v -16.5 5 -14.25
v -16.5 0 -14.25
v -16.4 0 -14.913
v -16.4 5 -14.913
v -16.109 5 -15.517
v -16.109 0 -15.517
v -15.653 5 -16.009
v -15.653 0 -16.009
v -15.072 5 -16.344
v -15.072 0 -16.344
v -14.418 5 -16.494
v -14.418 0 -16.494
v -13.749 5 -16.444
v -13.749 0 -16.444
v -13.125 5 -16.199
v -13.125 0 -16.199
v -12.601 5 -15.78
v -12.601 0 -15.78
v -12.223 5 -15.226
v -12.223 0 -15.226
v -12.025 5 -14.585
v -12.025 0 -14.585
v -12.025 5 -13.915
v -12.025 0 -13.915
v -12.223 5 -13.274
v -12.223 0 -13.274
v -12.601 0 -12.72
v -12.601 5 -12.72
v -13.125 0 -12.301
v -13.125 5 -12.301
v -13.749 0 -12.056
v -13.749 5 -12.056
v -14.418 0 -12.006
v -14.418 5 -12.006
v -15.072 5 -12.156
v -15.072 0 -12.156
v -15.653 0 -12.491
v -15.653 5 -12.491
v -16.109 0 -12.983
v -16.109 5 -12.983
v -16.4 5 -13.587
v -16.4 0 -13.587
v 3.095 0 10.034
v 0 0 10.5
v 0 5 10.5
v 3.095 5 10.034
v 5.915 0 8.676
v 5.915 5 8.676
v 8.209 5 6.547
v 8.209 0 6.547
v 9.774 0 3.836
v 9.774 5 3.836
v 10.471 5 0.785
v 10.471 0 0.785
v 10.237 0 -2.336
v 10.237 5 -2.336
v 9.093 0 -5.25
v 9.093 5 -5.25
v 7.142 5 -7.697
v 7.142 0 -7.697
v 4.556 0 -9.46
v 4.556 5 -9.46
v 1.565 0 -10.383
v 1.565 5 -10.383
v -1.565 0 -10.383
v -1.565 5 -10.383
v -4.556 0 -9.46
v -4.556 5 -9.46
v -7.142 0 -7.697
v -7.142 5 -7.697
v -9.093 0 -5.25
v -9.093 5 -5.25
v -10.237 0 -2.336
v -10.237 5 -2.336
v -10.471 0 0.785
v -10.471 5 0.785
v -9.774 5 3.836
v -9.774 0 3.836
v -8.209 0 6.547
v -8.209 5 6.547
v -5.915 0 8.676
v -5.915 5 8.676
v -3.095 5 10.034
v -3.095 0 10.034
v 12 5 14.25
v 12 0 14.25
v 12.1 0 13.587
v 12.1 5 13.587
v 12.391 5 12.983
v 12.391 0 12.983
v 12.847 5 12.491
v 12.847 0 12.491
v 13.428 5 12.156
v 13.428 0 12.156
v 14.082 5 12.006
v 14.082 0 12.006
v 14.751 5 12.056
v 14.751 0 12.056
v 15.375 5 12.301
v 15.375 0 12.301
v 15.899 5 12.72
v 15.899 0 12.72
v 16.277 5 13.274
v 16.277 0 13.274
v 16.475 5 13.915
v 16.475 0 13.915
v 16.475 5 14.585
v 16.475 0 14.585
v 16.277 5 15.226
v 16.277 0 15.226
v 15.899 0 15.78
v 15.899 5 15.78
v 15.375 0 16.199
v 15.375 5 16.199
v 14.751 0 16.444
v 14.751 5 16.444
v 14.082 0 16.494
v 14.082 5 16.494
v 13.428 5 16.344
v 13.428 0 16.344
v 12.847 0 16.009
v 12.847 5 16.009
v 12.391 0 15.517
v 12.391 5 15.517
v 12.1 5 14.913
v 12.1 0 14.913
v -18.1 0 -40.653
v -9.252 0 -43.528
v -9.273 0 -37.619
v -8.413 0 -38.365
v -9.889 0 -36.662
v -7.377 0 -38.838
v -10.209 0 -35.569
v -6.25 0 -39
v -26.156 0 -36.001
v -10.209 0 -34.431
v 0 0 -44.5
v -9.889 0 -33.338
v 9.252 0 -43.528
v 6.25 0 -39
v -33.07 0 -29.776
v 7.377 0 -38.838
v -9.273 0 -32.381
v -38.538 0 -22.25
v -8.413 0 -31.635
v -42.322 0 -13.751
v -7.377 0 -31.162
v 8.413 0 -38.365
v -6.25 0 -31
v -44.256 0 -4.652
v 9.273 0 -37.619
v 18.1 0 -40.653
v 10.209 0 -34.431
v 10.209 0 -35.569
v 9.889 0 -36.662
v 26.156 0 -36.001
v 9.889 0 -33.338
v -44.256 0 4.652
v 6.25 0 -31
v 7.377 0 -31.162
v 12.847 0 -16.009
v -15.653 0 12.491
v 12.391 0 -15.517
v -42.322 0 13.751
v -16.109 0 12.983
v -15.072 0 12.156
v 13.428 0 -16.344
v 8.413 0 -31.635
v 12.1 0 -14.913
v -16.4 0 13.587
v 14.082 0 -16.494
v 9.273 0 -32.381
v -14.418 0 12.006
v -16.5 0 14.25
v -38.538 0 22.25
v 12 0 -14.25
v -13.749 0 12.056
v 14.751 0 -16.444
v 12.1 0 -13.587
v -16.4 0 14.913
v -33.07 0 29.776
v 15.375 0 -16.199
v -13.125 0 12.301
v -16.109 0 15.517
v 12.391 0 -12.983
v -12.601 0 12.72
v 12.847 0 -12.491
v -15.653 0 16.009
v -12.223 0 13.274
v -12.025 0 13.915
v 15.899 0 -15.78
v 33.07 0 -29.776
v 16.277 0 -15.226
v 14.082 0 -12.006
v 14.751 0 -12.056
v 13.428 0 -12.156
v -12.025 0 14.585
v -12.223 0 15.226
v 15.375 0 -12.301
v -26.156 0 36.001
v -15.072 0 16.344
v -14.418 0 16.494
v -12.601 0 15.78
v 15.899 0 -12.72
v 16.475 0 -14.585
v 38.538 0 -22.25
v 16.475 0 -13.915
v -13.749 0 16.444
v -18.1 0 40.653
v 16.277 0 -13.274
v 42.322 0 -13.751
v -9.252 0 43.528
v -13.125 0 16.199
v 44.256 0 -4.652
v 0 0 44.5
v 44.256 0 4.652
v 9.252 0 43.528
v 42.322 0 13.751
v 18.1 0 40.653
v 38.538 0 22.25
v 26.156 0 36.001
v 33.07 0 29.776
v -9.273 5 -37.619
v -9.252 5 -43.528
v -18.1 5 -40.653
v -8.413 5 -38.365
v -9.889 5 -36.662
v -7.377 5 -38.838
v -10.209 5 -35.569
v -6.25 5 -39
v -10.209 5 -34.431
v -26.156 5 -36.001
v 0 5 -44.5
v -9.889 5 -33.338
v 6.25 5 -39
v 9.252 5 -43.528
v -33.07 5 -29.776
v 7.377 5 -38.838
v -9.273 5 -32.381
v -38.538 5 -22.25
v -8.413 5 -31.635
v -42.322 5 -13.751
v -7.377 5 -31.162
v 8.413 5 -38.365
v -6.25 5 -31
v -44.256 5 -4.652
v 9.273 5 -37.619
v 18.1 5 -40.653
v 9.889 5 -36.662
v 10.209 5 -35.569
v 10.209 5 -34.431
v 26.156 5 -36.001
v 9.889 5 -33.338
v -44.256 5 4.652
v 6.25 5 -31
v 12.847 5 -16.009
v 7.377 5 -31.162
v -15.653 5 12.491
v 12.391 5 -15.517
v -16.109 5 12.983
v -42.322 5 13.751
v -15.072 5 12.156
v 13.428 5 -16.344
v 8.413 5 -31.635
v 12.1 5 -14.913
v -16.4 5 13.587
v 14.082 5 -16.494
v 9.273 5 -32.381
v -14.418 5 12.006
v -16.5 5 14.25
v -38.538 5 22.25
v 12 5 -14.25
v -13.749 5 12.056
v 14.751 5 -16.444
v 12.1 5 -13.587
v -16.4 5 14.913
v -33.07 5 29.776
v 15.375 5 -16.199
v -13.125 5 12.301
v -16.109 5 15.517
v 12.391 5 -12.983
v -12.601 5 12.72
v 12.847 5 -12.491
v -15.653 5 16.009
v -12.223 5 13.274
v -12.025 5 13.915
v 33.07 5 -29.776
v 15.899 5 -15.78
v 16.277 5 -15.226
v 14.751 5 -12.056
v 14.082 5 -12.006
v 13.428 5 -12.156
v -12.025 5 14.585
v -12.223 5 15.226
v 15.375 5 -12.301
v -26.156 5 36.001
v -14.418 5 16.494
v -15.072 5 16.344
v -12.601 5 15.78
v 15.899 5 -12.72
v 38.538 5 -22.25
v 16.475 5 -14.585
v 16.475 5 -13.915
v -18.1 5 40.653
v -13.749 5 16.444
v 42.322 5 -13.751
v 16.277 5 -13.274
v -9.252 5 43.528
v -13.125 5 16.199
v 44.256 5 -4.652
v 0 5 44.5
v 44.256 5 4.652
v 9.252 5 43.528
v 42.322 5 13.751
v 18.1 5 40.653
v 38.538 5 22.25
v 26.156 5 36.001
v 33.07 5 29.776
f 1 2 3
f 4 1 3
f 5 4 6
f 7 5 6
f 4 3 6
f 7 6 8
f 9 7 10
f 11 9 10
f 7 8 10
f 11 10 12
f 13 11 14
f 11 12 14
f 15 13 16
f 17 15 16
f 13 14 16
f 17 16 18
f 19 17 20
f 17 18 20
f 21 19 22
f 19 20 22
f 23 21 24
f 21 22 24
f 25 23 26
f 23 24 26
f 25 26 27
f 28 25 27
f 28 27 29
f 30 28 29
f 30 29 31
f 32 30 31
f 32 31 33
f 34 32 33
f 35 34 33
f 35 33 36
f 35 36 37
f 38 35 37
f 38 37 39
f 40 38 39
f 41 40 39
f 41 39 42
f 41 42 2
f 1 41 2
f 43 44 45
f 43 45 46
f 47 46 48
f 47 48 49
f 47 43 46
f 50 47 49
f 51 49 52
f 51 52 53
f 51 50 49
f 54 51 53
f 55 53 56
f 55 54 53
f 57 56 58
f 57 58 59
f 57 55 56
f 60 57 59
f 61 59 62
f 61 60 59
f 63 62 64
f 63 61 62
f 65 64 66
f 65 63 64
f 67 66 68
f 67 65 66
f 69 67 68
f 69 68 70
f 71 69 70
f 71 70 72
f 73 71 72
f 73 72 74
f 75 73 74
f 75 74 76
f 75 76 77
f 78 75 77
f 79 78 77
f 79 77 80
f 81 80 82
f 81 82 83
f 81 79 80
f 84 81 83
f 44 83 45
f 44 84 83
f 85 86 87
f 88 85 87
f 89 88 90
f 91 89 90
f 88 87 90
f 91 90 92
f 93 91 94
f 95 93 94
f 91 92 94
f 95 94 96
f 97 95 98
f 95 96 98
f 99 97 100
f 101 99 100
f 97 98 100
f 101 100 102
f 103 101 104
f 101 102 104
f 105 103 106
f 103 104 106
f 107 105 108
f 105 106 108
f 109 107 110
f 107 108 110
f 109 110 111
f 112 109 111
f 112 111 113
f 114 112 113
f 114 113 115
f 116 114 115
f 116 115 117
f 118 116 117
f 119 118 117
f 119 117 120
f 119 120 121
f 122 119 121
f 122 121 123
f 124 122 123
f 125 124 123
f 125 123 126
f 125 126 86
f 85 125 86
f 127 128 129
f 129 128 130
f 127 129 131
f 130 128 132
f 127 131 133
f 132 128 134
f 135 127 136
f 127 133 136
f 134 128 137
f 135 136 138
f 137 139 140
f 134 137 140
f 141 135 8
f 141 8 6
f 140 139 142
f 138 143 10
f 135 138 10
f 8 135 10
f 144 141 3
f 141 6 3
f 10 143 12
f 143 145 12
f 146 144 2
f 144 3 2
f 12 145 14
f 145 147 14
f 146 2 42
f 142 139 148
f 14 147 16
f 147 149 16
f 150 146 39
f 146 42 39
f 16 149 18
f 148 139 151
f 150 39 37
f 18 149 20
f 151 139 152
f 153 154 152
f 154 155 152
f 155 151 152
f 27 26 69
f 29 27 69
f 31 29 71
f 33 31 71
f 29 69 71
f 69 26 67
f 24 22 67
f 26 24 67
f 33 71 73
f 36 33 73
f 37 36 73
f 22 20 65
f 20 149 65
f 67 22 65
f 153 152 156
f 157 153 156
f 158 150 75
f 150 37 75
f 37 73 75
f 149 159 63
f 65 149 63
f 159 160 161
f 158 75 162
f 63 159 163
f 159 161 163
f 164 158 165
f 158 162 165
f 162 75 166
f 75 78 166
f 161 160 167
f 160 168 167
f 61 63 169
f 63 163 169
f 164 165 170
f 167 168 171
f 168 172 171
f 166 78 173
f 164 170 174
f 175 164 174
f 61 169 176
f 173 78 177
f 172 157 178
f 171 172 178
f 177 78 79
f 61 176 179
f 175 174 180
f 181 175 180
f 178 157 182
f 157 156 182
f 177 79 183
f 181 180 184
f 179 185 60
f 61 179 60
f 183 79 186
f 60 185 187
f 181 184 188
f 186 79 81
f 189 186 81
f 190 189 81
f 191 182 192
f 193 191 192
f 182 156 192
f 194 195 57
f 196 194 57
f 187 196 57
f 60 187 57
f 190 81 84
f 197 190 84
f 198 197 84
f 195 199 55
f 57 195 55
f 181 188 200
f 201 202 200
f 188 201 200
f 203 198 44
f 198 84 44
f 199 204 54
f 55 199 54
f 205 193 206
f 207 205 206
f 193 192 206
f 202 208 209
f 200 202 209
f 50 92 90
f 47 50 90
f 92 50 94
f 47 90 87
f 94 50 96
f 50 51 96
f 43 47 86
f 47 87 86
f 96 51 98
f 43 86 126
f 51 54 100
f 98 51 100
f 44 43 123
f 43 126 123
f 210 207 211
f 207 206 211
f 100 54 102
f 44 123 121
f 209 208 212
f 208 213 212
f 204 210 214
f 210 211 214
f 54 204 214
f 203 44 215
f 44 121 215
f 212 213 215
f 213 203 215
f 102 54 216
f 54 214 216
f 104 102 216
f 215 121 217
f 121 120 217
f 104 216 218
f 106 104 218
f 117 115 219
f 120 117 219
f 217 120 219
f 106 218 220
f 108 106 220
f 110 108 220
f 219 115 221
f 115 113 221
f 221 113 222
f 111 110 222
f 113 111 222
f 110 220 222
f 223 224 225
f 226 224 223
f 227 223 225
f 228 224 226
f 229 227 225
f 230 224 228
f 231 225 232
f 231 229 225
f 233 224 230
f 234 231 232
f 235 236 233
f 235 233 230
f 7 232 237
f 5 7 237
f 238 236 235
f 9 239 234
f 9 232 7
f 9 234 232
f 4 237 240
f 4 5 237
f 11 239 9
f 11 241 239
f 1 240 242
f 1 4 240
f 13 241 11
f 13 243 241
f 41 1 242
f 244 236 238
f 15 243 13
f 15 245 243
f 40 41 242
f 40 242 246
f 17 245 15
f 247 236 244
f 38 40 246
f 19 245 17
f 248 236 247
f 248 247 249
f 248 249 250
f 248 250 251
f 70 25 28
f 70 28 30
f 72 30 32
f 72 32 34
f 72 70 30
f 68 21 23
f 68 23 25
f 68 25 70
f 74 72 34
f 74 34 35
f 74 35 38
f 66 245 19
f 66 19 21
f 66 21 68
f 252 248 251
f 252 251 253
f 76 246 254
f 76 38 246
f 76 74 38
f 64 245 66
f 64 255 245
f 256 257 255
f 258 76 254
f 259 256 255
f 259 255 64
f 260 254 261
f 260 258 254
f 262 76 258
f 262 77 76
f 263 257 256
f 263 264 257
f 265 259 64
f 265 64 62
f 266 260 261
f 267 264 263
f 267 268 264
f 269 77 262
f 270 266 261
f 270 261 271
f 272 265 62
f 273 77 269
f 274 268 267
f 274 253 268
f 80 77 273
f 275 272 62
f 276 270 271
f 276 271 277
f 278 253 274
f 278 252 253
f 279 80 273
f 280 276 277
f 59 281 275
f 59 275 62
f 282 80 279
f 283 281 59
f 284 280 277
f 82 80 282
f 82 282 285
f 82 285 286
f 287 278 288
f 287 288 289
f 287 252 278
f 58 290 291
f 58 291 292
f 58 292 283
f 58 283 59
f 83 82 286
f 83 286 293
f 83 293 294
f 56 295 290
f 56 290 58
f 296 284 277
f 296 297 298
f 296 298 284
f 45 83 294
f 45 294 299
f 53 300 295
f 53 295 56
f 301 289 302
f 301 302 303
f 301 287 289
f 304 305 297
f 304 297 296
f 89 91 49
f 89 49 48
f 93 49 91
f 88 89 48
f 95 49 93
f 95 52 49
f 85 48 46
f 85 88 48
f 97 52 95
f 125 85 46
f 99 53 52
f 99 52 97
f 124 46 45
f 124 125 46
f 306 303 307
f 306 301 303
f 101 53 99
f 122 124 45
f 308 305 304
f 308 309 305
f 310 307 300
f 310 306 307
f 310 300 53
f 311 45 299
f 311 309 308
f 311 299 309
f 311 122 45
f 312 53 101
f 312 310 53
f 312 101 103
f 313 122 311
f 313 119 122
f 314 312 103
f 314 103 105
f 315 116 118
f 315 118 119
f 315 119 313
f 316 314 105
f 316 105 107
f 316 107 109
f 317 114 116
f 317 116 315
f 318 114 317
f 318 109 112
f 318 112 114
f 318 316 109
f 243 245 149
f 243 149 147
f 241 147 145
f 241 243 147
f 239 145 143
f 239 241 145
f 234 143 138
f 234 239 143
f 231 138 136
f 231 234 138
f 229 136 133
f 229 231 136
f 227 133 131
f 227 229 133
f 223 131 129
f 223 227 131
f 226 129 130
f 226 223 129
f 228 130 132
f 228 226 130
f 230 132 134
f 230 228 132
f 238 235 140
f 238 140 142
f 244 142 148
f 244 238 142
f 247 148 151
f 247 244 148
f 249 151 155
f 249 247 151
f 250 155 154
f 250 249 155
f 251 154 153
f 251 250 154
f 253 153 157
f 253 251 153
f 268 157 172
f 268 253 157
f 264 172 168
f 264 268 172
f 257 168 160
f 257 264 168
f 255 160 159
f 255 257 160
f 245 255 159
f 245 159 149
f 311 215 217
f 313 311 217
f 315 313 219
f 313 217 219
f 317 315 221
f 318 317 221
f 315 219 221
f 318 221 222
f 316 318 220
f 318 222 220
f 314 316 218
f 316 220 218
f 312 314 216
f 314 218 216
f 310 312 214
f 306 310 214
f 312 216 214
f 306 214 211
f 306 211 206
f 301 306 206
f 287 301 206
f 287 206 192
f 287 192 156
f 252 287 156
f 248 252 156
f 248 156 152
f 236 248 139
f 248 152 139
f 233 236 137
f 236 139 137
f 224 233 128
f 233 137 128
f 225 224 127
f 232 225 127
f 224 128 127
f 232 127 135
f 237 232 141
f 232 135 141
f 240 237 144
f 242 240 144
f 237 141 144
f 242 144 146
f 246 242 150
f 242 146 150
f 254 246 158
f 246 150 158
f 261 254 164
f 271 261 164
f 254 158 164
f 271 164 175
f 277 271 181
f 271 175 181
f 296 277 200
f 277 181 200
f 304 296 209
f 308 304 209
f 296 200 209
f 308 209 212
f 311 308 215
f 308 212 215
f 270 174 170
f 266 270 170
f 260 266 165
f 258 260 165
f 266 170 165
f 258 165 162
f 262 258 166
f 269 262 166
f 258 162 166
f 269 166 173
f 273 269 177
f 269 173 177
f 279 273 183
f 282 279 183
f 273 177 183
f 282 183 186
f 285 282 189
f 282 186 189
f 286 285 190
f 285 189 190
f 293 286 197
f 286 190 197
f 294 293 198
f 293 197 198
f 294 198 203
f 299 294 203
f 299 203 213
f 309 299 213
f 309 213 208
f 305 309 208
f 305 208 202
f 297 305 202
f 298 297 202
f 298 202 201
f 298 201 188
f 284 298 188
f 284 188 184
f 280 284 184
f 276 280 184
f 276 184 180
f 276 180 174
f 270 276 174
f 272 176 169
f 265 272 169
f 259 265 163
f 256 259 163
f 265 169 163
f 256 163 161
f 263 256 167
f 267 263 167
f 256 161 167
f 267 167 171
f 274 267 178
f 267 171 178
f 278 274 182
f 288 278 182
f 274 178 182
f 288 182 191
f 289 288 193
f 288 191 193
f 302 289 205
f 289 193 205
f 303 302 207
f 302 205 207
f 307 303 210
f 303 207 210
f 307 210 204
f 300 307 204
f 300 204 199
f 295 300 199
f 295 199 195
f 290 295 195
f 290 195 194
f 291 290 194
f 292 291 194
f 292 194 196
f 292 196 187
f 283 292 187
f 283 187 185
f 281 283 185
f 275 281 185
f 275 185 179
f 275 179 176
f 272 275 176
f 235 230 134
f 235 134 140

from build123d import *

# Parameters (mm, degrees)
SKETCH1_R            = 44.5
SKETCH1_R_2          = 10.5
BODY_DEPTH           = 5
WIRE_HOLE_DEPTH      = 64.130816564
M4_CLEARANCE_HOLE1_D = 4.5


with BuildPart() as part:
    # Sketch1 → Body (new body)
    with BuildSketch(Plane(origin=(0, 0, 0), x_dir=(1, 0, 0), z_dir=(0, 1, 0))):
        with Locations(Location((0, 0, 0), (0, 0, 270))):
            Circle(SKETCH1_R)
        with Locations(Location((0, 0, 0), (0, 0, 270))):
            Circle(SKETCH1_R_2, mode=Mode.SUBTRACT)
    extrude(amount=BODY_DEPTH)

    # Sketch5 → Wire_Hole (cut, through all)
    with BuildSketch(Plane(origin=(0, 5, 0), x_dir=(1, 0, 0), z_dir=(0, 1, 0))):
        with BuildLine():
            Line((-6.25, 39), (6.25, 39))
            ThreePointArc((6.25, 39), (10.25, 35), (6.25, 31))
            Line((6.25, 31), (-6.25, 31))
            ThreePointArc((-6.25, 31), (-10.25, 35), (-6.25, 39))
        make_face()
    extrude(amount=-WIRE_HOLE_DEPTH, mode=Mode.SUBTRACT)

    # M4 Clearance Hole1 (through all)
    with Locations(Plane(origin=(0, 5, 0), x_dir=(1, 0, 0), z_dir=(0, 1, 0))):
        with Locations((-14.25, 14.25), (14.25, -14.25), (14.25, 14.25), (-14.25, -14.25)):
            Hole(M4_CLEARANCE_HOLE1_D / 2)


solid = part.part
